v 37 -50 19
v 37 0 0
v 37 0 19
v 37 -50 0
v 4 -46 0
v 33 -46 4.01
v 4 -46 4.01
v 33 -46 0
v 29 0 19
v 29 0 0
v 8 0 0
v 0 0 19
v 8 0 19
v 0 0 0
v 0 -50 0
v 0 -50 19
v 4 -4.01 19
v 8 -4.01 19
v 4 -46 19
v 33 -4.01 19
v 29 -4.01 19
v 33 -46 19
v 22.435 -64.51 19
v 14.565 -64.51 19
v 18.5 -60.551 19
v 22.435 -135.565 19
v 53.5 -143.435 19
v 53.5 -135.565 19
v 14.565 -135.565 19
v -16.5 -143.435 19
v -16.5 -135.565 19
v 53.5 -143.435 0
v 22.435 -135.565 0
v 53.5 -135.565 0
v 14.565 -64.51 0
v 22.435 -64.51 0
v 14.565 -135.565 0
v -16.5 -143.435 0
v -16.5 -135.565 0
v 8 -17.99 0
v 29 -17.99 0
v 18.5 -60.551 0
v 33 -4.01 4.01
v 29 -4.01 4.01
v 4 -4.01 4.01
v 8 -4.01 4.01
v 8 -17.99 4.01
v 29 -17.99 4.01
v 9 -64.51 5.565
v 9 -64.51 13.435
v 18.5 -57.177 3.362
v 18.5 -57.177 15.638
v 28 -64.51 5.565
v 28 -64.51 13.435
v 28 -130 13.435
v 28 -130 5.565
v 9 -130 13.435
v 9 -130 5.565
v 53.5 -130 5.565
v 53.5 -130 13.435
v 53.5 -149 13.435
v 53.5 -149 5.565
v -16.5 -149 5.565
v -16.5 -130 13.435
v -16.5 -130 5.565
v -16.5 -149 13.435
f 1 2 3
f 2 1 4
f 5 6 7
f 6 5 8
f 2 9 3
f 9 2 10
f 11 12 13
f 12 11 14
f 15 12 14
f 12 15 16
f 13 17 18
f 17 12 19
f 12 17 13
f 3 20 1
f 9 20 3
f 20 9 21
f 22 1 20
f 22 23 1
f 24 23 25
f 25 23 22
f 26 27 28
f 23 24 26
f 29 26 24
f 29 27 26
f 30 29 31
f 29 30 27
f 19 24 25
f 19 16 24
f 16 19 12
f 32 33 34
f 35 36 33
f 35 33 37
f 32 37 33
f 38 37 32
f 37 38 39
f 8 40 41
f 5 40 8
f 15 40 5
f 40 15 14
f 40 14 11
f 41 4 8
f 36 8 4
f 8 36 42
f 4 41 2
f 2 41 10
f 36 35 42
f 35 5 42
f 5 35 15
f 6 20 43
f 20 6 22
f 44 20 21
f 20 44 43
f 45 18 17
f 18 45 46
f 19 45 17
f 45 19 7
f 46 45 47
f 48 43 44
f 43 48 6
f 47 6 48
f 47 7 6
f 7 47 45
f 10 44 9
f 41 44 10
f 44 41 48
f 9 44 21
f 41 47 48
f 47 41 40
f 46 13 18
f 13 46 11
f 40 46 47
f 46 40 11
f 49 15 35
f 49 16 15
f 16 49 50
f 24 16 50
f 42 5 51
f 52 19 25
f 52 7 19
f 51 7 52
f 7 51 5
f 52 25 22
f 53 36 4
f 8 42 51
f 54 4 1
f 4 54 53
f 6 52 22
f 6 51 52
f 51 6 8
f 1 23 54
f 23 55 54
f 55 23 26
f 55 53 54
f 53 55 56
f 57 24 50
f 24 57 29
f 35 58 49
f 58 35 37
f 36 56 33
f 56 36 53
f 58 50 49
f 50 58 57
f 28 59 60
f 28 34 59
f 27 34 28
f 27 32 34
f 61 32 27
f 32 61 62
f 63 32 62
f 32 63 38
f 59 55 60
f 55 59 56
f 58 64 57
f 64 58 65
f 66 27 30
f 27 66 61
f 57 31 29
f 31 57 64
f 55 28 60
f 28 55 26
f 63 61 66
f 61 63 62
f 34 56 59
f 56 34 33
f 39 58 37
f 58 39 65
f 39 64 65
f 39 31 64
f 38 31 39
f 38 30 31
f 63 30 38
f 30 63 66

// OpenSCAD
/* A tool to remove ignition coils from the N43 engine of E87
Printables descroption:
I designed this tool to remove ignition coils from the N43B20 engine of my E87.
It will also probably work on N43B16 engine and other BMWs with one of those engines.
It could potentially even work on other engines if you change the model parameters
(clip_size is the size of the ignition coil clip, which is the part, that this tool grabs),
but that's probably a stretch.
Some people are able to pull them with bare hands (but sometimes break the clips),
some use a screwdriver as a lever (which is barbaric and could damage insulation
or the plastic of the coil). I find it easier to have the perfect tool, since I'm
planning to stick with this engine for a while.
I used the initial version of this tool and it was hard to pull the third coil
without removing the tension brace (which requires outer torx bit and could be avoided),
so I made a longer version with shorter handle, but the longer version is yet untested.
*/
wall=4;
handle_length=75;
handle_width=70;
clip_size=[29,15,42];
cut=18;
echo(clip_size);
rotate([90,0,0]) {
  difference() {
    translate([0,0,0]) cube(clip_size+[2*wall,wall,wall]);
    translate([wall,wall+1/100,wall+1/100]) cube(clip_size);
    translate([2*wall,-1/100,-1/100]) cube([clip_size[0]-2*wall,clip_size[0]+wall+2/100,cut]);
  }
  hull() {
    translate([0,0,clip_size[2]+wall]) cube([wall,clip_size[1]+wall,wall]);
    translate([(clip_size[0]+2*wall)/2,(clip_size[1]+wall)/2,clip_size[2]+2*wall+clip_size[0]/2])
      rotate([0,0,360/16])
        cylinder(d=(clip_size[1]+wall)/cos(360/16),h=1/100,$fn=8);
  }
  hull() {
    translate([clip_size[0]+wall,0,clip_size[2]+wall]) cube([wall,clip_size[1]+wall,wall]);
    translate([(clip_size[0]+2*wall)/2,(clip_size[1]+wall)/2,clip_size[2]+2*wall+clip_size[0]/2])
      rotate([0,0,360/16])
        cylinder(d=(clip_size[1]+wall)/cos(360/16),h=1/100,$fn=8);
  }
  translate([(clip_size[0]+2*wall)/2,(clip_size[1]+wall)/2,clip_size[2]+2*wall+clip_size[0]/2])
    rotate([0,0,360/16])
      cylinder(d=(clip_size[1]+wall)/cos(360/16),h=handle_length,$fn=8);
  translate([(clip_size[0]+2*wall)/2,(clip_size[1]+wall)/2,clip_size[2]+2*wall+clip_size[0]/2+handle_length])
    rotate([0,90,0])rotate([0,0,360/16])
      cylinder(d=(clip_size[1]+wall)/cos(360/16),h=handle_width,$fn=8,center=true);
}
